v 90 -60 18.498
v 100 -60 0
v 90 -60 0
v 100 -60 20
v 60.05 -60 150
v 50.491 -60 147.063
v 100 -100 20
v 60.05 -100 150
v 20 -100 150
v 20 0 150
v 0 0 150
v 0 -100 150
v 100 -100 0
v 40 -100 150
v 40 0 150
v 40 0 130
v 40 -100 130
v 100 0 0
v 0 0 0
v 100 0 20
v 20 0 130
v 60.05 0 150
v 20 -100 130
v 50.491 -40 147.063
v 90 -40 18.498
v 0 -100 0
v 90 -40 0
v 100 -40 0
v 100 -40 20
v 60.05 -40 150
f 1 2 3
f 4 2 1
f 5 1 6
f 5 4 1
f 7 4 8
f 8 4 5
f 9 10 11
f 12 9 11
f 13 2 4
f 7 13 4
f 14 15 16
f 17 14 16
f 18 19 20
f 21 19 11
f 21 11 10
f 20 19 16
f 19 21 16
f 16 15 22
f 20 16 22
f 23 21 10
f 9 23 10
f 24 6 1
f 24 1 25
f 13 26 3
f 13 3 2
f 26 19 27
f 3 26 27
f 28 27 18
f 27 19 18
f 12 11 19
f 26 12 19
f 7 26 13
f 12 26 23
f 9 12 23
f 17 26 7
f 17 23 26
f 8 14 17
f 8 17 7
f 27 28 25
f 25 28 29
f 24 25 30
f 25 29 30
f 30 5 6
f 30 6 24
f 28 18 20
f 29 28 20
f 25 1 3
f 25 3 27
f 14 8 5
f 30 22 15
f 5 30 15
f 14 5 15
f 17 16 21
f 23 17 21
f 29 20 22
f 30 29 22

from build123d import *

# Parameters (mm, degrees)
F1_DEPTH = 100
F3_W     = 20
F3_H     = 20
F4_DEPTH = 10
F2_W     = 20
F2_H     = 136
F5_DEPTH = 10
F6_DEPTH = 10
F7_W     = 20
F7_H     = 136
F8_DEPTH = 10


with BuildPart() as f1:
    # F0 (on Front) → F1 (new body)
    with BuildSketch(Plane.XZ):
        Polygon((0, 150), (0, 0), (100, 0), (100, 20), (60.0500312891, 150), (40, 150), (40, 130), (20, 130), (20, 150), align=None)
    extrude(amount=F1_DEPTH)

    # F3 (on face) → F4 (cut)
    with BuildSketch(Plane.YZ.offset(100)):
        with Locations((-50, 10)):
            Rectangle(F3_W, F3_H)
    extrude(amount=-F4_DEPTH, mode=Mode.SUBTRACT)

    # F2 (on face) → F5 (join)
    with BuildSketch(Plane(origin=(96.9869116916, 0, 29.8048006727), x_dir=(0, 1, 0), z_dir=(0.9558823529, 0, 0.2937497699))):
        with Locations((-50, 57.7426700655)):
            Rectangle(F2_W, F2_H)
    extrude(amount=F5_DEPTH)

    # F6 (cut): a face of the model
    f6_faces = [f1.faces().sort_by_distance(p)[0] for p in [
        (89.583839174, -50, 87.9374976993),
    ]]
    extrude(f6_faces, amount=-F6_DEPTH, mode=Mode.SUBTRACT)

    # F7 (on face) → F8 (cut)
    with BuildSketch(Plane(origin=(96.9869116916, 0, 29.8048006727), x_dir=(0, 1, 0), z_dir=(0.9558823529, 0, 0.2937497699))):
        with Locations((-50, 57.7426700655)):
            Rectangle(F7_W, F7_H)
    extrude(amount=-F8_DEPTH, mode=Mode.SUBTRACT)


solid = f1.part
